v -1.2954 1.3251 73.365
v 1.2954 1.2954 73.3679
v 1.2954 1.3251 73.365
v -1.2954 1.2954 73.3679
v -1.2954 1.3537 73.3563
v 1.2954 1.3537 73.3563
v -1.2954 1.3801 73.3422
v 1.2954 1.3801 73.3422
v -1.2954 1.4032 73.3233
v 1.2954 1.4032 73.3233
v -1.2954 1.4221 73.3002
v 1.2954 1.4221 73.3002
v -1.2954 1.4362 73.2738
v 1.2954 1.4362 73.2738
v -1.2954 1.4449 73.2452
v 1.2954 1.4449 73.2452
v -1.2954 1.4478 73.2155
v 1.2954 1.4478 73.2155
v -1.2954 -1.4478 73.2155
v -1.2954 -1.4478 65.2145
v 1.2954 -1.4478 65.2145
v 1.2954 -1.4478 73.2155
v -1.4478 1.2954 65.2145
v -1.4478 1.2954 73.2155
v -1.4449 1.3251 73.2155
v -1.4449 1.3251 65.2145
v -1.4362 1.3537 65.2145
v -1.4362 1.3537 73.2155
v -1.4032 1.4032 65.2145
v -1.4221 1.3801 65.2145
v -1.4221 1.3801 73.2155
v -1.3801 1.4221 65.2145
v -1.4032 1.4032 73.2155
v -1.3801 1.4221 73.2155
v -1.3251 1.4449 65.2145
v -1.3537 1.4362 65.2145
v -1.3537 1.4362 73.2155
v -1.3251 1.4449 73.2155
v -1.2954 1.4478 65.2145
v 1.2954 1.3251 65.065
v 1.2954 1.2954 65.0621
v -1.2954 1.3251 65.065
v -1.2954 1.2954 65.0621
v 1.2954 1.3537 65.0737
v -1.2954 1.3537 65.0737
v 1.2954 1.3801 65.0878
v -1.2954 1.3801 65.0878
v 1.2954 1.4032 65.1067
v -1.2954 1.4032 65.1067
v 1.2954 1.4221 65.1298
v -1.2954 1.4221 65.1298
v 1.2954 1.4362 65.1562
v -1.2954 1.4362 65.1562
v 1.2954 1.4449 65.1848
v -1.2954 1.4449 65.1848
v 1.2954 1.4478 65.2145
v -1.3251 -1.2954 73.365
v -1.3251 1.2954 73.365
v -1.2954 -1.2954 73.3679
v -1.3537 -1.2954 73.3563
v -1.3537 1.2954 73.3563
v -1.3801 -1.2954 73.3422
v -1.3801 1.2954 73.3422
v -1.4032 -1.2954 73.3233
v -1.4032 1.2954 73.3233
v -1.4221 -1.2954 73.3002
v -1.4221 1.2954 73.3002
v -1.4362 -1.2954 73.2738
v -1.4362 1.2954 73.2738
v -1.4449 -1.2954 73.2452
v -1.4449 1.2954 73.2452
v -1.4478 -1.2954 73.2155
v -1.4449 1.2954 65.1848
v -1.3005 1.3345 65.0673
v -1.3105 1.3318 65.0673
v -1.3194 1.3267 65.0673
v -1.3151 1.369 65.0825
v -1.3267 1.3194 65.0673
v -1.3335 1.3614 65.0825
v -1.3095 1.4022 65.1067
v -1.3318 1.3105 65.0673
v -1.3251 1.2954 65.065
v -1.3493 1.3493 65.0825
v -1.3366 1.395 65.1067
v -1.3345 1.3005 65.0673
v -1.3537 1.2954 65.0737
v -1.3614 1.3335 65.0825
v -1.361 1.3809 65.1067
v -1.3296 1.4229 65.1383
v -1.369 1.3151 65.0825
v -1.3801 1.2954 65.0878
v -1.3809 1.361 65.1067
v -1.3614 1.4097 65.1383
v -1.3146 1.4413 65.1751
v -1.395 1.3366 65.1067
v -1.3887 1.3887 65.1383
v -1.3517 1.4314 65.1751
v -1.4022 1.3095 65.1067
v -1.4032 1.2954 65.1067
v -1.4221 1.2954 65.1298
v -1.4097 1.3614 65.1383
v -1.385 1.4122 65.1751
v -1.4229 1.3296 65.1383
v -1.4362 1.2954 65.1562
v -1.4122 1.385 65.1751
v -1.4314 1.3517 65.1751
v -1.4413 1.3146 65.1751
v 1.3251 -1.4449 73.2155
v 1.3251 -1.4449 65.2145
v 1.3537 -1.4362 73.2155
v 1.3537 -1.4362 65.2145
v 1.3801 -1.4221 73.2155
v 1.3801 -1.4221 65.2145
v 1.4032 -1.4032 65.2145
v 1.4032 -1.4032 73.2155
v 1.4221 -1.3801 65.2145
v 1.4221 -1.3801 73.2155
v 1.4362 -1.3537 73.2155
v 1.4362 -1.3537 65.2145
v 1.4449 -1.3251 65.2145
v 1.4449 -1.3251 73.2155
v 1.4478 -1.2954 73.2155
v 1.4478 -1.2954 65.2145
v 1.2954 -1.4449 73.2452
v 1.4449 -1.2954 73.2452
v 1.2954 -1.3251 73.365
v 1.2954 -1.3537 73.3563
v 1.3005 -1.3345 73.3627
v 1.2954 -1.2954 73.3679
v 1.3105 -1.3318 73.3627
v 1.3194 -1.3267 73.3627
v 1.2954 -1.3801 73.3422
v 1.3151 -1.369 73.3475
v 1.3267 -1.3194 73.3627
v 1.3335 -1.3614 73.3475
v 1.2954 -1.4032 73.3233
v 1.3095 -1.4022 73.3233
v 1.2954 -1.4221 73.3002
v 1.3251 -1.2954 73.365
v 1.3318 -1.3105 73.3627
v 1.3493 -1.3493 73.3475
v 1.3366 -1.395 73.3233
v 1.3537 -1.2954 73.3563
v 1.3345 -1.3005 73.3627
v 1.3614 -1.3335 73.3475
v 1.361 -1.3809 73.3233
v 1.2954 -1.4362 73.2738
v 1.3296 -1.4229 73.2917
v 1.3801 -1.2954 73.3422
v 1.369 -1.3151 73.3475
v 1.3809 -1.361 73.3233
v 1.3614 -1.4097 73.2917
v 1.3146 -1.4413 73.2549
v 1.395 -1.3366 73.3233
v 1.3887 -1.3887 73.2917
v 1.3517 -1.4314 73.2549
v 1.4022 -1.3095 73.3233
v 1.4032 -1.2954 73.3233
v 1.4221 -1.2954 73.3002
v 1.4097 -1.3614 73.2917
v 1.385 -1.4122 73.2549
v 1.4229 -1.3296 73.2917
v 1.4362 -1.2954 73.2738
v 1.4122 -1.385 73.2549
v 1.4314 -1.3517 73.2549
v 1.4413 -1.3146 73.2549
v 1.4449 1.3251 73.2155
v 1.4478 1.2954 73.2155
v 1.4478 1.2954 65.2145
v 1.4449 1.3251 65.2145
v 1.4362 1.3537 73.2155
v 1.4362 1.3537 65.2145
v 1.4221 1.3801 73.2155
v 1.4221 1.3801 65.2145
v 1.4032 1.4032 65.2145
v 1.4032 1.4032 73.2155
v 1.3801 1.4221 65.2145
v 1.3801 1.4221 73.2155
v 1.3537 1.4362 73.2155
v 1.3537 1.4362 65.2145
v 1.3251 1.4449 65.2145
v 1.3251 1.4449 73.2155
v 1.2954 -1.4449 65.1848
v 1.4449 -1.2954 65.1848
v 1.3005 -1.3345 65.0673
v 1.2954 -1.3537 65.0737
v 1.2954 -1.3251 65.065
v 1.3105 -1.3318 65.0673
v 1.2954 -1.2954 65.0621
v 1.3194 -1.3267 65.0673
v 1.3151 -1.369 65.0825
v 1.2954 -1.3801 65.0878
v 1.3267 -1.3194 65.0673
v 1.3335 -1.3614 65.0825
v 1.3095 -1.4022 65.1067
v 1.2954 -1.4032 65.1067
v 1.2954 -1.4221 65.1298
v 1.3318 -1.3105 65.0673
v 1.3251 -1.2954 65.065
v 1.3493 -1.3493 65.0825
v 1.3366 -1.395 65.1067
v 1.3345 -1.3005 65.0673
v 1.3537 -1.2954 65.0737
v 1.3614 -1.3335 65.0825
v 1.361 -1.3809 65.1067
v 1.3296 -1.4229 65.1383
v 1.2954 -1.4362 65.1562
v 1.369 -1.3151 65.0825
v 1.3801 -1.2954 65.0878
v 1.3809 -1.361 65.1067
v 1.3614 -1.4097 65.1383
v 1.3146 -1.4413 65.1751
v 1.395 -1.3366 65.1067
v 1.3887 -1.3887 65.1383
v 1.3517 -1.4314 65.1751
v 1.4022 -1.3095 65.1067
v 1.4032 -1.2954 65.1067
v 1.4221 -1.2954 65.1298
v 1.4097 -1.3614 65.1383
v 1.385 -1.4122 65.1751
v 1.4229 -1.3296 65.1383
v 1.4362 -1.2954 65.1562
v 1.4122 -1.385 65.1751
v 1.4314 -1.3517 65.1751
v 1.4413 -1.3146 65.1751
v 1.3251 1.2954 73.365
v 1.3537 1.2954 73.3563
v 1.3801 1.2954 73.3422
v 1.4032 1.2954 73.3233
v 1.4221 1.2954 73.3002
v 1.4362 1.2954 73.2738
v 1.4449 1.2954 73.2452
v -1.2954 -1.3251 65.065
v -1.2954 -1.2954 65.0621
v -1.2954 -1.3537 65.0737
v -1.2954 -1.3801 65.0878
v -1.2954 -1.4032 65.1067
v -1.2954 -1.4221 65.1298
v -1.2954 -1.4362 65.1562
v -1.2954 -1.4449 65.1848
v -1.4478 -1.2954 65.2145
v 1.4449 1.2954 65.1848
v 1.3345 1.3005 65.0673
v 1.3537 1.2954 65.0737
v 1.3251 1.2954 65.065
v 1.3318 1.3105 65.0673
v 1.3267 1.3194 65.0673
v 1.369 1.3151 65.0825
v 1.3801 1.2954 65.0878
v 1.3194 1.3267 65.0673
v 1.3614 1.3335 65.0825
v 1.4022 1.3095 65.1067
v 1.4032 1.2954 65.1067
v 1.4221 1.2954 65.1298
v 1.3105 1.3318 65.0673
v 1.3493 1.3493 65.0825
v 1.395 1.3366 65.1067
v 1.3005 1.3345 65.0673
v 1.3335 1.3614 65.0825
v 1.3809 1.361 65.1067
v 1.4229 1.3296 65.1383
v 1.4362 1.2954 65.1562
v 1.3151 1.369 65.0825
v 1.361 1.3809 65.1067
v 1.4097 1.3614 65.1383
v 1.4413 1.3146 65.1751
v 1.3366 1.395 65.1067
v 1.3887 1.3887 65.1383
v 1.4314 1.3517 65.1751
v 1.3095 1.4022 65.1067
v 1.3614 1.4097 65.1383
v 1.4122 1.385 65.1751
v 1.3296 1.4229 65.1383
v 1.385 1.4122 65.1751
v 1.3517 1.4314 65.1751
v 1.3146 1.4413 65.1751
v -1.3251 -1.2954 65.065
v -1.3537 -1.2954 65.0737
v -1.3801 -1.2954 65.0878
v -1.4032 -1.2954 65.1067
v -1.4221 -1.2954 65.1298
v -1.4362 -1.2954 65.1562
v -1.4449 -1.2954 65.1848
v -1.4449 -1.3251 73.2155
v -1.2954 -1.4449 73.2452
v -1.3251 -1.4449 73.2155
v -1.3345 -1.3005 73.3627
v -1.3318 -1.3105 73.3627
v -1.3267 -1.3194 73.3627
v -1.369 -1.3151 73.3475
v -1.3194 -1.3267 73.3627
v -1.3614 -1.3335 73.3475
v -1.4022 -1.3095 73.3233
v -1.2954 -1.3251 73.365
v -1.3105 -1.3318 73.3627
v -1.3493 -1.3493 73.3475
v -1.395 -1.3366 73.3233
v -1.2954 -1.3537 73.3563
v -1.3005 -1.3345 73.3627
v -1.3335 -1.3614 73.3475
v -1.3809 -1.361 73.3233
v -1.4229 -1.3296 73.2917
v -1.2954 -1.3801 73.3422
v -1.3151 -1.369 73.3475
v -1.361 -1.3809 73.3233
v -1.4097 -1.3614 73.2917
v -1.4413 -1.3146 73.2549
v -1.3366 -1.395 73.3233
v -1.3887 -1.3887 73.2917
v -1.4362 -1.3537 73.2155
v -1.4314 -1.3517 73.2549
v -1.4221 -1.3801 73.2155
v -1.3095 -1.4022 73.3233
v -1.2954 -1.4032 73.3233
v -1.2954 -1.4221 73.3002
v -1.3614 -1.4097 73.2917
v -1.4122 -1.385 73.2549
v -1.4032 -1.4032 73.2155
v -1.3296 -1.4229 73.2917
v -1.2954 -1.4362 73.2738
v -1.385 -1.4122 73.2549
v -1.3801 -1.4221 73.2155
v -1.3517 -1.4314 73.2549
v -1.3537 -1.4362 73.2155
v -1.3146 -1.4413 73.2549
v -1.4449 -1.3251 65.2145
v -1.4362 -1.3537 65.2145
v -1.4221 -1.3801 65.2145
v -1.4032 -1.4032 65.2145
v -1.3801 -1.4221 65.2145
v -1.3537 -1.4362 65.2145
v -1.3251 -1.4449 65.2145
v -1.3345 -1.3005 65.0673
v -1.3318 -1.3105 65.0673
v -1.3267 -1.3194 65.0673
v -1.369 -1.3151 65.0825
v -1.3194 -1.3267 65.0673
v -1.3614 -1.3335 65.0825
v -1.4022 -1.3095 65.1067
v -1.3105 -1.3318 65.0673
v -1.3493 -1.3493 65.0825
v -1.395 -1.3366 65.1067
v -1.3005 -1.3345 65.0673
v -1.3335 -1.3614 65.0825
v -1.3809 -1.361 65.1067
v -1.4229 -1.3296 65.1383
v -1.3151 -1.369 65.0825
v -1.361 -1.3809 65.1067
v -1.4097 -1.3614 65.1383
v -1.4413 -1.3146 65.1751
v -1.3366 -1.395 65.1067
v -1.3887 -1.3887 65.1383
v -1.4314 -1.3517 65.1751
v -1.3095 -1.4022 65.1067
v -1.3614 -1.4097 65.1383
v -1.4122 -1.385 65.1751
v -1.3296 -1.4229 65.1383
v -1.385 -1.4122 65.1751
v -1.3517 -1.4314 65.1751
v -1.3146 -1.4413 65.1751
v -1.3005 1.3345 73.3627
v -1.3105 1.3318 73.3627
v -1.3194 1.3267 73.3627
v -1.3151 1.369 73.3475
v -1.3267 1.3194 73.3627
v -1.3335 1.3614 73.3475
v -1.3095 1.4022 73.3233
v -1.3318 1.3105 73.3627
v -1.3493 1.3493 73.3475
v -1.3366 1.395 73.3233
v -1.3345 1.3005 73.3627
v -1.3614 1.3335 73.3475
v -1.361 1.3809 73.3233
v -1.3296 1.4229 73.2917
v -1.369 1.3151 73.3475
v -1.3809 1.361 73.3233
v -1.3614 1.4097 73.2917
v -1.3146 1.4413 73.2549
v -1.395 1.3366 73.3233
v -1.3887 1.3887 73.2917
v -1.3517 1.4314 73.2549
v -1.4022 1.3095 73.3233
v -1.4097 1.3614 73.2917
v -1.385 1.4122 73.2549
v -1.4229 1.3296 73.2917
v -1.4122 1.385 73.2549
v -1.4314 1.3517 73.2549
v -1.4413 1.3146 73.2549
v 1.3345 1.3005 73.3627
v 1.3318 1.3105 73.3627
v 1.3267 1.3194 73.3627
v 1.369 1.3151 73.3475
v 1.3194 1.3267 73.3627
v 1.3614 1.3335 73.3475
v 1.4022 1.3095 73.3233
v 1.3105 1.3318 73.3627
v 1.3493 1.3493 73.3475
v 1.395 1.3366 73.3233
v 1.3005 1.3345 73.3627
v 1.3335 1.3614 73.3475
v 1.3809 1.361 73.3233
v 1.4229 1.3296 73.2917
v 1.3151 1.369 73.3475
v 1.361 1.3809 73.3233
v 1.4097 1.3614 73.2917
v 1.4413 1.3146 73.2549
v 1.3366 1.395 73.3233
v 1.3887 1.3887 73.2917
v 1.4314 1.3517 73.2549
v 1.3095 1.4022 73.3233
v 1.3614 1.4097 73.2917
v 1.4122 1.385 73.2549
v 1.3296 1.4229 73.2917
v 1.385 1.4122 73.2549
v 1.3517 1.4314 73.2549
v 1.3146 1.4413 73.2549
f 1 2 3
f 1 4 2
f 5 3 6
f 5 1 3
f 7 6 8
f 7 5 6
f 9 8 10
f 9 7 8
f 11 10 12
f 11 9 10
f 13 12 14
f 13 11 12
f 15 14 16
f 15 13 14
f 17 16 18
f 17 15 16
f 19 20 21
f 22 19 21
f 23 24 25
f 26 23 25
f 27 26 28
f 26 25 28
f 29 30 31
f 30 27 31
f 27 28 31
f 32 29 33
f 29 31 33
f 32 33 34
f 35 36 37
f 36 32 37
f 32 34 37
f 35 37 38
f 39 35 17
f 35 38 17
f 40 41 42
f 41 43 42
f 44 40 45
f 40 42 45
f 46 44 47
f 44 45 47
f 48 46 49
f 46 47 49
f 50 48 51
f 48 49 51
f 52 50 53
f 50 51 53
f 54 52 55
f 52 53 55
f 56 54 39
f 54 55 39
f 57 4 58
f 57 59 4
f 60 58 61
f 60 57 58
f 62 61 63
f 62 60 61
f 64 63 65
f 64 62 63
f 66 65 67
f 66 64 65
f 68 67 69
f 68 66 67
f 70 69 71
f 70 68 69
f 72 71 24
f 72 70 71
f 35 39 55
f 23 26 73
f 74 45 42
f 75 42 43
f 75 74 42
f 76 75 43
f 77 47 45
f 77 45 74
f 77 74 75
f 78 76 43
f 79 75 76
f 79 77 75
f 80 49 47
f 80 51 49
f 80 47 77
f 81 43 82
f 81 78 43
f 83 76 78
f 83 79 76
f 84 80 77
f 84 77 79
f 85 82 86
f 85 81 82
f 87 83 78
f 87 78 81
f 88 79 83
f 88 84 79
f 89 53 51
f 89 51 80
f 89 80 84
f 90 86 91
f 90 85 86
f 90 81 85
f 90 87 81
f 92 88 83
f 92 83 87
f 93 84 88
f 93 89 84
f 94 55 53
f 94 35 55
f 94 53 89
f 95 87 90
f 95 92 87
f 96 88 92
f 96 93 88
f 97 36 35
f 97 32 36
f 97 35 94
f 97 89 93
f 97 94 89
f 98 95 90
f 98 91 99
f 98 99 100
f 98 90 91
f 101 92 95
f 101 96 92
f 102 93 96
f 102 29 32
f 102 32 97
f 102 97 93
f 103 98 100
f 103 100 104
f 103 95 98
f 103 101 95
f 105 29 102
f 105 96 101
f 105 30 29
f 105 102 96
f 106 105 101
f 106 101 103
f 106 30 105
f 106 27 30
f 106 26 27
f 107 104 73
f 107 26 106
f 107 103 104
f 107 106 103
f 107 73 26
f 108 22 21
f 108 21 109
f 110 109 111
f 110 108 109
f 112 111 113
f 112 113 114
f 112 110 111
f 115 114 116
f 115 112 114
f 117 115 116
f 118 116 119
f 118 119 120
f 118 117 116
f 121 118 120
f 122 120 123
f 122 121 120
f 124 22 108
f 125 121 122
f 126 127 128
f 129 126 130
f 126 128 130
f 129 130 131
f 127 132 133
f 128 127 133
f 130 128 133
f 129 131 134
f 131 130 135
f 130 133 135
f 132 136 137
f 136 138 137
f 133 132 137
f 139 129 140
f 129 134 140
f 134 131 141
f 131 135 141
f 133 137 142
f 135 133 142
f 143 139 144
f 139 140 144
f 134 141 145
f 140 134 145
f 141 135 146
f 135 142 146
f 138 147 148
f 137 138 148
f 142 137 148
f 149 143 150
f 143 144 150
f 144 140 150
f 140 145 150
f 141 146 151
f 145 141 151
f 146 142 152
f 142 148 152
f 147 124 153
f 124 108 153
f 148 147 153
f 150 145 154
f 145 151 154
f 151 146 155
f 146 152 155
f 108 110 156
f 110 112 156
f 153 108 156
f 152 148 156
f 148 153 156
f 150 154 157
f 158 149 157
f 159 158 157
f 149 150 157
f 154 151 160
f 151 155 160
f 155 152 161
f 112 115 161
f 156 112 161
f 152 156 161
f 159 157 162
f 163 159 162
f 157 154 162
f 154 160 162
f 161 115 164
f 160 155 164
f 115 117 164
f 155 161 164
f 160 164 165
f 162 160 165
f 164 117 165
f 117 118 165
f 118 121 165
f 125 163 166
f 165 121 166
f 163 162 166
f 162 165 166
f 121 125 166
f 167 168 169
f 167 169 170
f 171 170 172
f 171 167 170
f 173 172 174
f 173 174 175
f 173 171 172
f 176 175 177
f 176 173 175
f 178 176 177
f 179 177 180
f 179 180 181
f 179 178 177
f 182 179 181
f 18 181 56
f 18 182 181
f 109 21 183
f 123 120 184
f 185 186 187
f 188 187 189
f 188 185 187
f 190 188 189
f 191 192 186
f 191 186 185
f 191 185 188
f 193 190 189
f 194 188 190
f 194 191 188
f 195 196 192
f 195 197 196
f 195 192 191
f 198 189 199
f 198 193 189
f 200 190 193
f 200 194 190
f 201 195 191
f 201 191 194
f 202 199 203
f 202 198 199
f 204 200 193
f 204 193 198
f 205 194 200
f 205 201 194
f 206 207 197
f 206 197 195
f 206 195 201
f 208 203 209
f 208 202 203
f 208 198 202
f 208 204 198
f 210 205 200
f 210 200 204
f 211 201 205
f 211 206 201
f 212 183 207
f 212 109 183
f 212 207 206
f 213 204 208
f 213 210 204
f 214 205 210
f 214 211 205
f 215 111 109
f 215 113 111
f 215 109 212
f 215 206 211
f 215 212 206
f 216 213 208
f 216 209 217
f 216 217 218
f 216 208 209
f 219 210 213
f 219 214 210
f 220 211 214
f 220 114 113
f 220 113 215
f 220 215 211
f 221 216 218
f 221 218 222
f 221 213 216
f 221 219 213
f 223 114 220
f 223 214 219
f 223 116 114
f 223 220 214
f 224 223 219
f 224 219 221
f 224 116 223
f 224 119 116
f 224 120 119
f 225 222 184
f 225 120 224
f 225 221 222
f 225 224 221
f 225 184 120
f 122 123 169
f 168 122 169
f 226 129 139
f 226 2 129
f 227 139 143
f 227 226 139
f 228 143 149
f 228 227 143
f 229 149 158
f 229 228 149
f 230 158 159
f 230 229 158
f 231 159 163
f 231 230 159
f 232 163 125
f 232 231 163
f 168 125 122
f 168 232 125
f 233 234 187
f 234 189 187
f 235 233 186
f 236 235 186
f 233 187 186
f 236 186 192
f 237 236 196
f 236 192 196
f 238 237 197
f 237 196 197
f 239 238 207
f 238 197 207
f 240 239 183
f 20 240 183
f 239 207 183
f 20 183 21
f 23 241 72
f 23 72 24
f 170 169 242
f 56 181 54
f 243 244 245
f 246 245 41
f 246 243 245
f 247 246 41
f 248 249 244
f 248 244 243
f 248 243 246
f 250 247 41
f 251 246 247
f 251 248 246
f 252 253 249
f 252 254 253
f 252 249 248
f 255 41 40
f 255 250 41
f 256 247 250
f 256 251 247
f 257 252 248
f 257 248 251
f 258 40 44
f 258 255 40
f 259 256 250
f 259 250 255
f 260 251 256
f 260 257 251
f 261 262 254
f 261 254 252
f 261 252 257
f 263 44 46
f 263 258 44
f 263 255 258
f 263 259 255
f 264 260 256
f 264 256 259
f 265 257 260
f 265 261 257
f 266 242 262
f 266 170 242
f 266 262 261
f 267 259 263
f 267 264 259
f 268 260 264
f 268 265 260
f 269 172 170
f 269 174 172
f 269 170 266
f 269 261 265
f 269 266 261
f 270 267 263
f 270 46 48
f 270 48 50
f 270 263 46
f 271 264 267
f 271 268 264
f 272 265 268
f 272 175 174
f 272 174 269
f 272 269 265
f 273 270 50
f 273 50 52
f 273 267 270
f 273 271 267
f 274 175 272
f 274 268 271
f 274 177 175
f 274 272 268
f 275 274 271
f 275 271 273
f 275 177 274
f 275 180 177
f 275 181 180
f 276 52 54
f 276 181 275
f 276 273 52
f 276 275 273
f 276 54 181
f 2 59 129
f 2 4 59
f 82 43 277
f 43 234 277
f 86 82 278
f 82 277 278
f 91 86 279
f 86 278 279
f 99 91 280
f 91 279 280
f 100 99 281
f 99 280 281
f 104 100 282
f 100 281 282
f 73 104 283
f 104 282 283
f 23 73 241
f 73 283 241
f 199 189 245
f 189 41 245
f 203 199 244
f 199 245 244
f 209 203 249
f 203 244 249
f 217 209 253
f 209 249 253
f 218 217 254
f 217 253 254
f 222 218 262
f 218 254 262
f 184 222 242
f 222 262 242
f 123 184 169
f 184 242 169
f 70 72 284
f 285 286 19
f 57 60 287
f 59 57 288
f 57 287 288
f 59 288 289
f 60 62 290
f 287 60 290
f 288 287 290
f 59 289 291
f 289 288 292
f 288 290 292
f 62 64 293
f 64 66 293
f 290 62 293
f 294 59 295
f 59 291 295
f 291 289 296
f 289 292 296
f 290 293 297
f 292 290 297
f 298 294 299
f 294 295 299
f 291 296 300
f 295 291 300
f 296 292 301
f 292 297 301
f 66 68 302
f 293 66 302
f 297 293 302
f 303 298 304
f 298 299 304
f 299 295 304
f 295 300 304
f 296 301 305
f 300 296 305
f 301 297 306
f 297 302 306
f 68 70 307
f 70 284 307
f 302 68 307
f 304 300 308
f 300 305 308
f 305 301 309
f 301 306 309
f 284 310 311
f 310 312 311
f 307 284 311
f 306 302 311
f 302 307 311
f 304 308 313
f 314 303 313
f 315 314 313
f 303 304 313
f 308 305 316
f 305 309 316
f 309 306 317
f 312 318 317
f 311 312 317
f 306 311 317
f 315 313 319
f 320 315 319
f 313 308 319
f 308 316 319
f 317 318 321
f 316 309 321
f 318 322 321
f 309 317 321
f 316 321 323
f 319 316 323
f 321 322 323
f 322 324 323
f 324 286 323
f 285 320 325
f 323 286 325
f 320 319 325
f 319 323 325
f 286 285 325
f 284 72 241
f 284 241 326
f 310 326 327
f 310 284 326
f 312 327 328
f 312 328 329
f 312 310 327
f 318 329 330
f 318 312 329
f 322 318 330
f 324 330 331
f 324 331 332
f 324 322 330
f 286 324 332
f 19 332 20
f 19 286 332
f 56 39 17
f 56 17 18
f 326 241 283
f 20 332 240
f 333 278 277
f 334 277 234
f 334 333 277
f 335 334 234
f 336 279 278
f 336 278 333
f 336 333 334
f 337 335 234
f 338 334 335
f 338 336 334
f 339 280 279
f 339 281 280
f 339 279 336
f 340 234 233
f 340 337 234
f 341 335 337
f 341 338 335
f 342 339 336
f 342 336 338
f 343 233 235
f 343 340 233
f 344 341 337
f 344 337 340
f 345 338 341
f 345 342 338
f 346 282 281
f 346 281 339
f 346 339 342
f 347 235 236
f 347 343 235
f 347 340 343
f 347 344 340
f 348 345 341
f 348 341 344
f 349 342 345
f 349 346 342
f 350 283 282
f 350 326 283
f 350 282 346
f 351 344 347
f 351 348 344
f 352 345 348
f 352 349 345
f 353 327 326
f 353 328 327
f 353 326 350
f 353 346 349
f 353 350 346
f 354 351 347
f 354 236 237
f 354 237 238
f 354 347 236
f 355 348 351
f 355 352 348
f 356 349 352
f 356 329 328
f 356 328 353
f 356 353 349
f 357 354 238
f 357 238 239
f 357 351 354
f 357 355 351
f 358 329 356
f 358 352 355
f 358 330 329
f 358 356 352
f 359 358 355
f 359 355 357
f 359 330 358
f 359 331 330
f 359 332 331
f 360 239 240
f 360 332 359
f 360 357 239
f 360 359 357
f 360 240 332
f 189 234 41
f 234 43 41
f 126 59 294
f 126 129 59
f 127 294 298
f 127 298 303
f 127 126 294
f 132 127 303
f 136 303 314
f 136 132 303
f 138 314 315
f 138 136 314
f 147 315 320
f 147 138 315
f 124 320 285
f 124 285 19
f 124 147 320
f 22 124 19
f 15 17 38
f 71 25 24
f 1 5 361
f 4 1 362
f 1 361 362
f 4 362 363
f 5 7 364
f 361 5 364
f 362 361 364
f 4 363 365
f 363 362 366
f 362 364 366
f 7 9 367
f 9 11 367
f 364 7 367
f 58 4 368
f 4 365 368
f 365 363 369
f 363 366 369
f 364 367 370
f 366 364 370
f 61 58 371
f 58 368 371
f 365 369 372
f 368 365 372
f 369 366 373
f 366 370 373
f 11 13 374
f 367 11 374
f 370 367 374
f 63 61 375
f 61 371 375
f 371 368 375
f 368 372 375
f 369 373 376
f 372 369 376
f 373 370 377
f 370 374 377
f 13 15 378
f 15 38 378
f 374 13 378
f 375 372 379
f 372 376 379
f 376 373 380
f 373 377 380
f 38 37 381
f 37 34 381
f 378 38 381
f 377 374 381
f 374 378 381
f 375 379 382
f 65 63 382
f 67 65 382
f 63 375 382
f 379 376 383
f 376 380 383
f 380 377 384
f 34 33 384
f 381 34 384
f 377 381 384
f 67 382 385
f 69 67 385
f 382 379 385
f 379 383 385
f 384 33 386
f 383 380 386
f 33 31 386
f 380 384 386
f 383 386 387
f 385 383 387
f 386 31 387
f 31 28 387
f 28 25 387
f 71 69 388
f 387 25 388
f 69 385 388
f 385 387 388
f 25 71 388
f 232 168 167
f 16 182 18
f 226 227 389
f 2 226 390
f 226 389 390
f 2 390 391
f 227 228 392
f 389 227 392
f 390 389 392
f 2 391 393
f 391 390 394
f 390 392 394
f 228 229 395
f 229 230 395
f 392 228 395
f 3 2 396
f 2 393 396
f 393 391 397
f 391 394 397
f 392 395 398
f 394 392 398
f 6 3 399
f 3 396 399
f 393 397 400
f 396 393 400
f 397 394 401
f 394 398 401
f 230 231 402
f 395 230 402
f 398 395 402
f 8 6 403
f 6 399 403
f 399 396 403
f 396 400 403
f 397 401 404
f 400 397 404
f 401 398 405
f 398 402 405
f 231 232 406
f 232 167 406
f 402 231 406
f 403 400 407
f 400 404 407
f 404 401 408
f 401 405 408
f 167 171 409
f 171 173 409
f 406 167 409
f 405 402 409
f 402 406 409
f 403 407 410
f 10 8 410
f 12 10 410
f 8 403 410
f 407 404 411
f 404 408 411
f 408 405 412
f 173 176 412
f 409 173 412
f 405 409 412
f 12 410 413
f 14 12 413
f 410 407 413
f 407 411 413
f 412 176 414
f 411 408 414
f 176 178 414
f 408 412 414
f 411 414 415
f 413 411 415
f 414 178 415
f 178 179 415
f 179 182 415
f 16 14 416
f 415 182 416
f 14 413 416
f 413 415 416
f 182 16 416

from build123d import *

# Parameters (mm, degrees)
SKETCH1_W           = 48.26
SKETCH1_H           = 48.26
BOSS_EXTRUDE1_DEPTH = 138.43
FILLET1_R           = 2.54
FILLET2_R           = 2.54
SCALE1_SCALE        = 0.06


with BuildPart() as part:
    # Sketch1 → Boss-Extrude1 (new body)
    with BuildSketch(Plane.XY):
        Rectangle(SKETCH1_W, SKETCH1_H)
    extrude(amount=BOSS_EXTRUDE1_DEPTH)

    # Fillet1
    fillet1_edges = [part.edges().sort_by_distance(p)[0] for p in [
        (-24.13, 24.13, 69.215),
        (24.13, 24.13, 69.215),
        (24.13, -24.13, 69.215),
        (-24.13, -24.13, 69.215),
    ]]
    fillet(fillet1_edges, radius=FILLET1_R)

    # Fillet2
    fillet2_edges = [part.edges().sort_by_distance(p)[0] for p in [
        (0, -24.13, 0),
        (0, -24.13, 138.43),
        (-24.13, 0, 0),
        (0, 24.13, 0),
        (24.13, 0, 0),
        (-23.386051224, 23.386051224, 0),
        (23.386051224, 23.386051224, 0),
        (23.386051224, -23.386051224, 0),
        (-23.386051224, -23.386051224, 0),
        (-24.13, 0, 138.43),
        (24.13, 0, 138.43),
        (0, 24.13, 138.43),
        (-23.386051224, 23.386051224, 138.43),
        (23.386051224, 23.386051224, 138.43),
        (23.386051224, -23.386051224, 138.43),
        (-23.386051224, -23.386051224, 138.43),
    ]]
    fillet(fillet2_edges, radius=FILLET2_R)


with BuildPart() as part_1:
    # Scale1: scaled about (0, 0, 69.215)
    add(part.part.scale(SCALE1_SCALE).moved(Location((0, 0, 65.0621))))


solid = part_1.part
